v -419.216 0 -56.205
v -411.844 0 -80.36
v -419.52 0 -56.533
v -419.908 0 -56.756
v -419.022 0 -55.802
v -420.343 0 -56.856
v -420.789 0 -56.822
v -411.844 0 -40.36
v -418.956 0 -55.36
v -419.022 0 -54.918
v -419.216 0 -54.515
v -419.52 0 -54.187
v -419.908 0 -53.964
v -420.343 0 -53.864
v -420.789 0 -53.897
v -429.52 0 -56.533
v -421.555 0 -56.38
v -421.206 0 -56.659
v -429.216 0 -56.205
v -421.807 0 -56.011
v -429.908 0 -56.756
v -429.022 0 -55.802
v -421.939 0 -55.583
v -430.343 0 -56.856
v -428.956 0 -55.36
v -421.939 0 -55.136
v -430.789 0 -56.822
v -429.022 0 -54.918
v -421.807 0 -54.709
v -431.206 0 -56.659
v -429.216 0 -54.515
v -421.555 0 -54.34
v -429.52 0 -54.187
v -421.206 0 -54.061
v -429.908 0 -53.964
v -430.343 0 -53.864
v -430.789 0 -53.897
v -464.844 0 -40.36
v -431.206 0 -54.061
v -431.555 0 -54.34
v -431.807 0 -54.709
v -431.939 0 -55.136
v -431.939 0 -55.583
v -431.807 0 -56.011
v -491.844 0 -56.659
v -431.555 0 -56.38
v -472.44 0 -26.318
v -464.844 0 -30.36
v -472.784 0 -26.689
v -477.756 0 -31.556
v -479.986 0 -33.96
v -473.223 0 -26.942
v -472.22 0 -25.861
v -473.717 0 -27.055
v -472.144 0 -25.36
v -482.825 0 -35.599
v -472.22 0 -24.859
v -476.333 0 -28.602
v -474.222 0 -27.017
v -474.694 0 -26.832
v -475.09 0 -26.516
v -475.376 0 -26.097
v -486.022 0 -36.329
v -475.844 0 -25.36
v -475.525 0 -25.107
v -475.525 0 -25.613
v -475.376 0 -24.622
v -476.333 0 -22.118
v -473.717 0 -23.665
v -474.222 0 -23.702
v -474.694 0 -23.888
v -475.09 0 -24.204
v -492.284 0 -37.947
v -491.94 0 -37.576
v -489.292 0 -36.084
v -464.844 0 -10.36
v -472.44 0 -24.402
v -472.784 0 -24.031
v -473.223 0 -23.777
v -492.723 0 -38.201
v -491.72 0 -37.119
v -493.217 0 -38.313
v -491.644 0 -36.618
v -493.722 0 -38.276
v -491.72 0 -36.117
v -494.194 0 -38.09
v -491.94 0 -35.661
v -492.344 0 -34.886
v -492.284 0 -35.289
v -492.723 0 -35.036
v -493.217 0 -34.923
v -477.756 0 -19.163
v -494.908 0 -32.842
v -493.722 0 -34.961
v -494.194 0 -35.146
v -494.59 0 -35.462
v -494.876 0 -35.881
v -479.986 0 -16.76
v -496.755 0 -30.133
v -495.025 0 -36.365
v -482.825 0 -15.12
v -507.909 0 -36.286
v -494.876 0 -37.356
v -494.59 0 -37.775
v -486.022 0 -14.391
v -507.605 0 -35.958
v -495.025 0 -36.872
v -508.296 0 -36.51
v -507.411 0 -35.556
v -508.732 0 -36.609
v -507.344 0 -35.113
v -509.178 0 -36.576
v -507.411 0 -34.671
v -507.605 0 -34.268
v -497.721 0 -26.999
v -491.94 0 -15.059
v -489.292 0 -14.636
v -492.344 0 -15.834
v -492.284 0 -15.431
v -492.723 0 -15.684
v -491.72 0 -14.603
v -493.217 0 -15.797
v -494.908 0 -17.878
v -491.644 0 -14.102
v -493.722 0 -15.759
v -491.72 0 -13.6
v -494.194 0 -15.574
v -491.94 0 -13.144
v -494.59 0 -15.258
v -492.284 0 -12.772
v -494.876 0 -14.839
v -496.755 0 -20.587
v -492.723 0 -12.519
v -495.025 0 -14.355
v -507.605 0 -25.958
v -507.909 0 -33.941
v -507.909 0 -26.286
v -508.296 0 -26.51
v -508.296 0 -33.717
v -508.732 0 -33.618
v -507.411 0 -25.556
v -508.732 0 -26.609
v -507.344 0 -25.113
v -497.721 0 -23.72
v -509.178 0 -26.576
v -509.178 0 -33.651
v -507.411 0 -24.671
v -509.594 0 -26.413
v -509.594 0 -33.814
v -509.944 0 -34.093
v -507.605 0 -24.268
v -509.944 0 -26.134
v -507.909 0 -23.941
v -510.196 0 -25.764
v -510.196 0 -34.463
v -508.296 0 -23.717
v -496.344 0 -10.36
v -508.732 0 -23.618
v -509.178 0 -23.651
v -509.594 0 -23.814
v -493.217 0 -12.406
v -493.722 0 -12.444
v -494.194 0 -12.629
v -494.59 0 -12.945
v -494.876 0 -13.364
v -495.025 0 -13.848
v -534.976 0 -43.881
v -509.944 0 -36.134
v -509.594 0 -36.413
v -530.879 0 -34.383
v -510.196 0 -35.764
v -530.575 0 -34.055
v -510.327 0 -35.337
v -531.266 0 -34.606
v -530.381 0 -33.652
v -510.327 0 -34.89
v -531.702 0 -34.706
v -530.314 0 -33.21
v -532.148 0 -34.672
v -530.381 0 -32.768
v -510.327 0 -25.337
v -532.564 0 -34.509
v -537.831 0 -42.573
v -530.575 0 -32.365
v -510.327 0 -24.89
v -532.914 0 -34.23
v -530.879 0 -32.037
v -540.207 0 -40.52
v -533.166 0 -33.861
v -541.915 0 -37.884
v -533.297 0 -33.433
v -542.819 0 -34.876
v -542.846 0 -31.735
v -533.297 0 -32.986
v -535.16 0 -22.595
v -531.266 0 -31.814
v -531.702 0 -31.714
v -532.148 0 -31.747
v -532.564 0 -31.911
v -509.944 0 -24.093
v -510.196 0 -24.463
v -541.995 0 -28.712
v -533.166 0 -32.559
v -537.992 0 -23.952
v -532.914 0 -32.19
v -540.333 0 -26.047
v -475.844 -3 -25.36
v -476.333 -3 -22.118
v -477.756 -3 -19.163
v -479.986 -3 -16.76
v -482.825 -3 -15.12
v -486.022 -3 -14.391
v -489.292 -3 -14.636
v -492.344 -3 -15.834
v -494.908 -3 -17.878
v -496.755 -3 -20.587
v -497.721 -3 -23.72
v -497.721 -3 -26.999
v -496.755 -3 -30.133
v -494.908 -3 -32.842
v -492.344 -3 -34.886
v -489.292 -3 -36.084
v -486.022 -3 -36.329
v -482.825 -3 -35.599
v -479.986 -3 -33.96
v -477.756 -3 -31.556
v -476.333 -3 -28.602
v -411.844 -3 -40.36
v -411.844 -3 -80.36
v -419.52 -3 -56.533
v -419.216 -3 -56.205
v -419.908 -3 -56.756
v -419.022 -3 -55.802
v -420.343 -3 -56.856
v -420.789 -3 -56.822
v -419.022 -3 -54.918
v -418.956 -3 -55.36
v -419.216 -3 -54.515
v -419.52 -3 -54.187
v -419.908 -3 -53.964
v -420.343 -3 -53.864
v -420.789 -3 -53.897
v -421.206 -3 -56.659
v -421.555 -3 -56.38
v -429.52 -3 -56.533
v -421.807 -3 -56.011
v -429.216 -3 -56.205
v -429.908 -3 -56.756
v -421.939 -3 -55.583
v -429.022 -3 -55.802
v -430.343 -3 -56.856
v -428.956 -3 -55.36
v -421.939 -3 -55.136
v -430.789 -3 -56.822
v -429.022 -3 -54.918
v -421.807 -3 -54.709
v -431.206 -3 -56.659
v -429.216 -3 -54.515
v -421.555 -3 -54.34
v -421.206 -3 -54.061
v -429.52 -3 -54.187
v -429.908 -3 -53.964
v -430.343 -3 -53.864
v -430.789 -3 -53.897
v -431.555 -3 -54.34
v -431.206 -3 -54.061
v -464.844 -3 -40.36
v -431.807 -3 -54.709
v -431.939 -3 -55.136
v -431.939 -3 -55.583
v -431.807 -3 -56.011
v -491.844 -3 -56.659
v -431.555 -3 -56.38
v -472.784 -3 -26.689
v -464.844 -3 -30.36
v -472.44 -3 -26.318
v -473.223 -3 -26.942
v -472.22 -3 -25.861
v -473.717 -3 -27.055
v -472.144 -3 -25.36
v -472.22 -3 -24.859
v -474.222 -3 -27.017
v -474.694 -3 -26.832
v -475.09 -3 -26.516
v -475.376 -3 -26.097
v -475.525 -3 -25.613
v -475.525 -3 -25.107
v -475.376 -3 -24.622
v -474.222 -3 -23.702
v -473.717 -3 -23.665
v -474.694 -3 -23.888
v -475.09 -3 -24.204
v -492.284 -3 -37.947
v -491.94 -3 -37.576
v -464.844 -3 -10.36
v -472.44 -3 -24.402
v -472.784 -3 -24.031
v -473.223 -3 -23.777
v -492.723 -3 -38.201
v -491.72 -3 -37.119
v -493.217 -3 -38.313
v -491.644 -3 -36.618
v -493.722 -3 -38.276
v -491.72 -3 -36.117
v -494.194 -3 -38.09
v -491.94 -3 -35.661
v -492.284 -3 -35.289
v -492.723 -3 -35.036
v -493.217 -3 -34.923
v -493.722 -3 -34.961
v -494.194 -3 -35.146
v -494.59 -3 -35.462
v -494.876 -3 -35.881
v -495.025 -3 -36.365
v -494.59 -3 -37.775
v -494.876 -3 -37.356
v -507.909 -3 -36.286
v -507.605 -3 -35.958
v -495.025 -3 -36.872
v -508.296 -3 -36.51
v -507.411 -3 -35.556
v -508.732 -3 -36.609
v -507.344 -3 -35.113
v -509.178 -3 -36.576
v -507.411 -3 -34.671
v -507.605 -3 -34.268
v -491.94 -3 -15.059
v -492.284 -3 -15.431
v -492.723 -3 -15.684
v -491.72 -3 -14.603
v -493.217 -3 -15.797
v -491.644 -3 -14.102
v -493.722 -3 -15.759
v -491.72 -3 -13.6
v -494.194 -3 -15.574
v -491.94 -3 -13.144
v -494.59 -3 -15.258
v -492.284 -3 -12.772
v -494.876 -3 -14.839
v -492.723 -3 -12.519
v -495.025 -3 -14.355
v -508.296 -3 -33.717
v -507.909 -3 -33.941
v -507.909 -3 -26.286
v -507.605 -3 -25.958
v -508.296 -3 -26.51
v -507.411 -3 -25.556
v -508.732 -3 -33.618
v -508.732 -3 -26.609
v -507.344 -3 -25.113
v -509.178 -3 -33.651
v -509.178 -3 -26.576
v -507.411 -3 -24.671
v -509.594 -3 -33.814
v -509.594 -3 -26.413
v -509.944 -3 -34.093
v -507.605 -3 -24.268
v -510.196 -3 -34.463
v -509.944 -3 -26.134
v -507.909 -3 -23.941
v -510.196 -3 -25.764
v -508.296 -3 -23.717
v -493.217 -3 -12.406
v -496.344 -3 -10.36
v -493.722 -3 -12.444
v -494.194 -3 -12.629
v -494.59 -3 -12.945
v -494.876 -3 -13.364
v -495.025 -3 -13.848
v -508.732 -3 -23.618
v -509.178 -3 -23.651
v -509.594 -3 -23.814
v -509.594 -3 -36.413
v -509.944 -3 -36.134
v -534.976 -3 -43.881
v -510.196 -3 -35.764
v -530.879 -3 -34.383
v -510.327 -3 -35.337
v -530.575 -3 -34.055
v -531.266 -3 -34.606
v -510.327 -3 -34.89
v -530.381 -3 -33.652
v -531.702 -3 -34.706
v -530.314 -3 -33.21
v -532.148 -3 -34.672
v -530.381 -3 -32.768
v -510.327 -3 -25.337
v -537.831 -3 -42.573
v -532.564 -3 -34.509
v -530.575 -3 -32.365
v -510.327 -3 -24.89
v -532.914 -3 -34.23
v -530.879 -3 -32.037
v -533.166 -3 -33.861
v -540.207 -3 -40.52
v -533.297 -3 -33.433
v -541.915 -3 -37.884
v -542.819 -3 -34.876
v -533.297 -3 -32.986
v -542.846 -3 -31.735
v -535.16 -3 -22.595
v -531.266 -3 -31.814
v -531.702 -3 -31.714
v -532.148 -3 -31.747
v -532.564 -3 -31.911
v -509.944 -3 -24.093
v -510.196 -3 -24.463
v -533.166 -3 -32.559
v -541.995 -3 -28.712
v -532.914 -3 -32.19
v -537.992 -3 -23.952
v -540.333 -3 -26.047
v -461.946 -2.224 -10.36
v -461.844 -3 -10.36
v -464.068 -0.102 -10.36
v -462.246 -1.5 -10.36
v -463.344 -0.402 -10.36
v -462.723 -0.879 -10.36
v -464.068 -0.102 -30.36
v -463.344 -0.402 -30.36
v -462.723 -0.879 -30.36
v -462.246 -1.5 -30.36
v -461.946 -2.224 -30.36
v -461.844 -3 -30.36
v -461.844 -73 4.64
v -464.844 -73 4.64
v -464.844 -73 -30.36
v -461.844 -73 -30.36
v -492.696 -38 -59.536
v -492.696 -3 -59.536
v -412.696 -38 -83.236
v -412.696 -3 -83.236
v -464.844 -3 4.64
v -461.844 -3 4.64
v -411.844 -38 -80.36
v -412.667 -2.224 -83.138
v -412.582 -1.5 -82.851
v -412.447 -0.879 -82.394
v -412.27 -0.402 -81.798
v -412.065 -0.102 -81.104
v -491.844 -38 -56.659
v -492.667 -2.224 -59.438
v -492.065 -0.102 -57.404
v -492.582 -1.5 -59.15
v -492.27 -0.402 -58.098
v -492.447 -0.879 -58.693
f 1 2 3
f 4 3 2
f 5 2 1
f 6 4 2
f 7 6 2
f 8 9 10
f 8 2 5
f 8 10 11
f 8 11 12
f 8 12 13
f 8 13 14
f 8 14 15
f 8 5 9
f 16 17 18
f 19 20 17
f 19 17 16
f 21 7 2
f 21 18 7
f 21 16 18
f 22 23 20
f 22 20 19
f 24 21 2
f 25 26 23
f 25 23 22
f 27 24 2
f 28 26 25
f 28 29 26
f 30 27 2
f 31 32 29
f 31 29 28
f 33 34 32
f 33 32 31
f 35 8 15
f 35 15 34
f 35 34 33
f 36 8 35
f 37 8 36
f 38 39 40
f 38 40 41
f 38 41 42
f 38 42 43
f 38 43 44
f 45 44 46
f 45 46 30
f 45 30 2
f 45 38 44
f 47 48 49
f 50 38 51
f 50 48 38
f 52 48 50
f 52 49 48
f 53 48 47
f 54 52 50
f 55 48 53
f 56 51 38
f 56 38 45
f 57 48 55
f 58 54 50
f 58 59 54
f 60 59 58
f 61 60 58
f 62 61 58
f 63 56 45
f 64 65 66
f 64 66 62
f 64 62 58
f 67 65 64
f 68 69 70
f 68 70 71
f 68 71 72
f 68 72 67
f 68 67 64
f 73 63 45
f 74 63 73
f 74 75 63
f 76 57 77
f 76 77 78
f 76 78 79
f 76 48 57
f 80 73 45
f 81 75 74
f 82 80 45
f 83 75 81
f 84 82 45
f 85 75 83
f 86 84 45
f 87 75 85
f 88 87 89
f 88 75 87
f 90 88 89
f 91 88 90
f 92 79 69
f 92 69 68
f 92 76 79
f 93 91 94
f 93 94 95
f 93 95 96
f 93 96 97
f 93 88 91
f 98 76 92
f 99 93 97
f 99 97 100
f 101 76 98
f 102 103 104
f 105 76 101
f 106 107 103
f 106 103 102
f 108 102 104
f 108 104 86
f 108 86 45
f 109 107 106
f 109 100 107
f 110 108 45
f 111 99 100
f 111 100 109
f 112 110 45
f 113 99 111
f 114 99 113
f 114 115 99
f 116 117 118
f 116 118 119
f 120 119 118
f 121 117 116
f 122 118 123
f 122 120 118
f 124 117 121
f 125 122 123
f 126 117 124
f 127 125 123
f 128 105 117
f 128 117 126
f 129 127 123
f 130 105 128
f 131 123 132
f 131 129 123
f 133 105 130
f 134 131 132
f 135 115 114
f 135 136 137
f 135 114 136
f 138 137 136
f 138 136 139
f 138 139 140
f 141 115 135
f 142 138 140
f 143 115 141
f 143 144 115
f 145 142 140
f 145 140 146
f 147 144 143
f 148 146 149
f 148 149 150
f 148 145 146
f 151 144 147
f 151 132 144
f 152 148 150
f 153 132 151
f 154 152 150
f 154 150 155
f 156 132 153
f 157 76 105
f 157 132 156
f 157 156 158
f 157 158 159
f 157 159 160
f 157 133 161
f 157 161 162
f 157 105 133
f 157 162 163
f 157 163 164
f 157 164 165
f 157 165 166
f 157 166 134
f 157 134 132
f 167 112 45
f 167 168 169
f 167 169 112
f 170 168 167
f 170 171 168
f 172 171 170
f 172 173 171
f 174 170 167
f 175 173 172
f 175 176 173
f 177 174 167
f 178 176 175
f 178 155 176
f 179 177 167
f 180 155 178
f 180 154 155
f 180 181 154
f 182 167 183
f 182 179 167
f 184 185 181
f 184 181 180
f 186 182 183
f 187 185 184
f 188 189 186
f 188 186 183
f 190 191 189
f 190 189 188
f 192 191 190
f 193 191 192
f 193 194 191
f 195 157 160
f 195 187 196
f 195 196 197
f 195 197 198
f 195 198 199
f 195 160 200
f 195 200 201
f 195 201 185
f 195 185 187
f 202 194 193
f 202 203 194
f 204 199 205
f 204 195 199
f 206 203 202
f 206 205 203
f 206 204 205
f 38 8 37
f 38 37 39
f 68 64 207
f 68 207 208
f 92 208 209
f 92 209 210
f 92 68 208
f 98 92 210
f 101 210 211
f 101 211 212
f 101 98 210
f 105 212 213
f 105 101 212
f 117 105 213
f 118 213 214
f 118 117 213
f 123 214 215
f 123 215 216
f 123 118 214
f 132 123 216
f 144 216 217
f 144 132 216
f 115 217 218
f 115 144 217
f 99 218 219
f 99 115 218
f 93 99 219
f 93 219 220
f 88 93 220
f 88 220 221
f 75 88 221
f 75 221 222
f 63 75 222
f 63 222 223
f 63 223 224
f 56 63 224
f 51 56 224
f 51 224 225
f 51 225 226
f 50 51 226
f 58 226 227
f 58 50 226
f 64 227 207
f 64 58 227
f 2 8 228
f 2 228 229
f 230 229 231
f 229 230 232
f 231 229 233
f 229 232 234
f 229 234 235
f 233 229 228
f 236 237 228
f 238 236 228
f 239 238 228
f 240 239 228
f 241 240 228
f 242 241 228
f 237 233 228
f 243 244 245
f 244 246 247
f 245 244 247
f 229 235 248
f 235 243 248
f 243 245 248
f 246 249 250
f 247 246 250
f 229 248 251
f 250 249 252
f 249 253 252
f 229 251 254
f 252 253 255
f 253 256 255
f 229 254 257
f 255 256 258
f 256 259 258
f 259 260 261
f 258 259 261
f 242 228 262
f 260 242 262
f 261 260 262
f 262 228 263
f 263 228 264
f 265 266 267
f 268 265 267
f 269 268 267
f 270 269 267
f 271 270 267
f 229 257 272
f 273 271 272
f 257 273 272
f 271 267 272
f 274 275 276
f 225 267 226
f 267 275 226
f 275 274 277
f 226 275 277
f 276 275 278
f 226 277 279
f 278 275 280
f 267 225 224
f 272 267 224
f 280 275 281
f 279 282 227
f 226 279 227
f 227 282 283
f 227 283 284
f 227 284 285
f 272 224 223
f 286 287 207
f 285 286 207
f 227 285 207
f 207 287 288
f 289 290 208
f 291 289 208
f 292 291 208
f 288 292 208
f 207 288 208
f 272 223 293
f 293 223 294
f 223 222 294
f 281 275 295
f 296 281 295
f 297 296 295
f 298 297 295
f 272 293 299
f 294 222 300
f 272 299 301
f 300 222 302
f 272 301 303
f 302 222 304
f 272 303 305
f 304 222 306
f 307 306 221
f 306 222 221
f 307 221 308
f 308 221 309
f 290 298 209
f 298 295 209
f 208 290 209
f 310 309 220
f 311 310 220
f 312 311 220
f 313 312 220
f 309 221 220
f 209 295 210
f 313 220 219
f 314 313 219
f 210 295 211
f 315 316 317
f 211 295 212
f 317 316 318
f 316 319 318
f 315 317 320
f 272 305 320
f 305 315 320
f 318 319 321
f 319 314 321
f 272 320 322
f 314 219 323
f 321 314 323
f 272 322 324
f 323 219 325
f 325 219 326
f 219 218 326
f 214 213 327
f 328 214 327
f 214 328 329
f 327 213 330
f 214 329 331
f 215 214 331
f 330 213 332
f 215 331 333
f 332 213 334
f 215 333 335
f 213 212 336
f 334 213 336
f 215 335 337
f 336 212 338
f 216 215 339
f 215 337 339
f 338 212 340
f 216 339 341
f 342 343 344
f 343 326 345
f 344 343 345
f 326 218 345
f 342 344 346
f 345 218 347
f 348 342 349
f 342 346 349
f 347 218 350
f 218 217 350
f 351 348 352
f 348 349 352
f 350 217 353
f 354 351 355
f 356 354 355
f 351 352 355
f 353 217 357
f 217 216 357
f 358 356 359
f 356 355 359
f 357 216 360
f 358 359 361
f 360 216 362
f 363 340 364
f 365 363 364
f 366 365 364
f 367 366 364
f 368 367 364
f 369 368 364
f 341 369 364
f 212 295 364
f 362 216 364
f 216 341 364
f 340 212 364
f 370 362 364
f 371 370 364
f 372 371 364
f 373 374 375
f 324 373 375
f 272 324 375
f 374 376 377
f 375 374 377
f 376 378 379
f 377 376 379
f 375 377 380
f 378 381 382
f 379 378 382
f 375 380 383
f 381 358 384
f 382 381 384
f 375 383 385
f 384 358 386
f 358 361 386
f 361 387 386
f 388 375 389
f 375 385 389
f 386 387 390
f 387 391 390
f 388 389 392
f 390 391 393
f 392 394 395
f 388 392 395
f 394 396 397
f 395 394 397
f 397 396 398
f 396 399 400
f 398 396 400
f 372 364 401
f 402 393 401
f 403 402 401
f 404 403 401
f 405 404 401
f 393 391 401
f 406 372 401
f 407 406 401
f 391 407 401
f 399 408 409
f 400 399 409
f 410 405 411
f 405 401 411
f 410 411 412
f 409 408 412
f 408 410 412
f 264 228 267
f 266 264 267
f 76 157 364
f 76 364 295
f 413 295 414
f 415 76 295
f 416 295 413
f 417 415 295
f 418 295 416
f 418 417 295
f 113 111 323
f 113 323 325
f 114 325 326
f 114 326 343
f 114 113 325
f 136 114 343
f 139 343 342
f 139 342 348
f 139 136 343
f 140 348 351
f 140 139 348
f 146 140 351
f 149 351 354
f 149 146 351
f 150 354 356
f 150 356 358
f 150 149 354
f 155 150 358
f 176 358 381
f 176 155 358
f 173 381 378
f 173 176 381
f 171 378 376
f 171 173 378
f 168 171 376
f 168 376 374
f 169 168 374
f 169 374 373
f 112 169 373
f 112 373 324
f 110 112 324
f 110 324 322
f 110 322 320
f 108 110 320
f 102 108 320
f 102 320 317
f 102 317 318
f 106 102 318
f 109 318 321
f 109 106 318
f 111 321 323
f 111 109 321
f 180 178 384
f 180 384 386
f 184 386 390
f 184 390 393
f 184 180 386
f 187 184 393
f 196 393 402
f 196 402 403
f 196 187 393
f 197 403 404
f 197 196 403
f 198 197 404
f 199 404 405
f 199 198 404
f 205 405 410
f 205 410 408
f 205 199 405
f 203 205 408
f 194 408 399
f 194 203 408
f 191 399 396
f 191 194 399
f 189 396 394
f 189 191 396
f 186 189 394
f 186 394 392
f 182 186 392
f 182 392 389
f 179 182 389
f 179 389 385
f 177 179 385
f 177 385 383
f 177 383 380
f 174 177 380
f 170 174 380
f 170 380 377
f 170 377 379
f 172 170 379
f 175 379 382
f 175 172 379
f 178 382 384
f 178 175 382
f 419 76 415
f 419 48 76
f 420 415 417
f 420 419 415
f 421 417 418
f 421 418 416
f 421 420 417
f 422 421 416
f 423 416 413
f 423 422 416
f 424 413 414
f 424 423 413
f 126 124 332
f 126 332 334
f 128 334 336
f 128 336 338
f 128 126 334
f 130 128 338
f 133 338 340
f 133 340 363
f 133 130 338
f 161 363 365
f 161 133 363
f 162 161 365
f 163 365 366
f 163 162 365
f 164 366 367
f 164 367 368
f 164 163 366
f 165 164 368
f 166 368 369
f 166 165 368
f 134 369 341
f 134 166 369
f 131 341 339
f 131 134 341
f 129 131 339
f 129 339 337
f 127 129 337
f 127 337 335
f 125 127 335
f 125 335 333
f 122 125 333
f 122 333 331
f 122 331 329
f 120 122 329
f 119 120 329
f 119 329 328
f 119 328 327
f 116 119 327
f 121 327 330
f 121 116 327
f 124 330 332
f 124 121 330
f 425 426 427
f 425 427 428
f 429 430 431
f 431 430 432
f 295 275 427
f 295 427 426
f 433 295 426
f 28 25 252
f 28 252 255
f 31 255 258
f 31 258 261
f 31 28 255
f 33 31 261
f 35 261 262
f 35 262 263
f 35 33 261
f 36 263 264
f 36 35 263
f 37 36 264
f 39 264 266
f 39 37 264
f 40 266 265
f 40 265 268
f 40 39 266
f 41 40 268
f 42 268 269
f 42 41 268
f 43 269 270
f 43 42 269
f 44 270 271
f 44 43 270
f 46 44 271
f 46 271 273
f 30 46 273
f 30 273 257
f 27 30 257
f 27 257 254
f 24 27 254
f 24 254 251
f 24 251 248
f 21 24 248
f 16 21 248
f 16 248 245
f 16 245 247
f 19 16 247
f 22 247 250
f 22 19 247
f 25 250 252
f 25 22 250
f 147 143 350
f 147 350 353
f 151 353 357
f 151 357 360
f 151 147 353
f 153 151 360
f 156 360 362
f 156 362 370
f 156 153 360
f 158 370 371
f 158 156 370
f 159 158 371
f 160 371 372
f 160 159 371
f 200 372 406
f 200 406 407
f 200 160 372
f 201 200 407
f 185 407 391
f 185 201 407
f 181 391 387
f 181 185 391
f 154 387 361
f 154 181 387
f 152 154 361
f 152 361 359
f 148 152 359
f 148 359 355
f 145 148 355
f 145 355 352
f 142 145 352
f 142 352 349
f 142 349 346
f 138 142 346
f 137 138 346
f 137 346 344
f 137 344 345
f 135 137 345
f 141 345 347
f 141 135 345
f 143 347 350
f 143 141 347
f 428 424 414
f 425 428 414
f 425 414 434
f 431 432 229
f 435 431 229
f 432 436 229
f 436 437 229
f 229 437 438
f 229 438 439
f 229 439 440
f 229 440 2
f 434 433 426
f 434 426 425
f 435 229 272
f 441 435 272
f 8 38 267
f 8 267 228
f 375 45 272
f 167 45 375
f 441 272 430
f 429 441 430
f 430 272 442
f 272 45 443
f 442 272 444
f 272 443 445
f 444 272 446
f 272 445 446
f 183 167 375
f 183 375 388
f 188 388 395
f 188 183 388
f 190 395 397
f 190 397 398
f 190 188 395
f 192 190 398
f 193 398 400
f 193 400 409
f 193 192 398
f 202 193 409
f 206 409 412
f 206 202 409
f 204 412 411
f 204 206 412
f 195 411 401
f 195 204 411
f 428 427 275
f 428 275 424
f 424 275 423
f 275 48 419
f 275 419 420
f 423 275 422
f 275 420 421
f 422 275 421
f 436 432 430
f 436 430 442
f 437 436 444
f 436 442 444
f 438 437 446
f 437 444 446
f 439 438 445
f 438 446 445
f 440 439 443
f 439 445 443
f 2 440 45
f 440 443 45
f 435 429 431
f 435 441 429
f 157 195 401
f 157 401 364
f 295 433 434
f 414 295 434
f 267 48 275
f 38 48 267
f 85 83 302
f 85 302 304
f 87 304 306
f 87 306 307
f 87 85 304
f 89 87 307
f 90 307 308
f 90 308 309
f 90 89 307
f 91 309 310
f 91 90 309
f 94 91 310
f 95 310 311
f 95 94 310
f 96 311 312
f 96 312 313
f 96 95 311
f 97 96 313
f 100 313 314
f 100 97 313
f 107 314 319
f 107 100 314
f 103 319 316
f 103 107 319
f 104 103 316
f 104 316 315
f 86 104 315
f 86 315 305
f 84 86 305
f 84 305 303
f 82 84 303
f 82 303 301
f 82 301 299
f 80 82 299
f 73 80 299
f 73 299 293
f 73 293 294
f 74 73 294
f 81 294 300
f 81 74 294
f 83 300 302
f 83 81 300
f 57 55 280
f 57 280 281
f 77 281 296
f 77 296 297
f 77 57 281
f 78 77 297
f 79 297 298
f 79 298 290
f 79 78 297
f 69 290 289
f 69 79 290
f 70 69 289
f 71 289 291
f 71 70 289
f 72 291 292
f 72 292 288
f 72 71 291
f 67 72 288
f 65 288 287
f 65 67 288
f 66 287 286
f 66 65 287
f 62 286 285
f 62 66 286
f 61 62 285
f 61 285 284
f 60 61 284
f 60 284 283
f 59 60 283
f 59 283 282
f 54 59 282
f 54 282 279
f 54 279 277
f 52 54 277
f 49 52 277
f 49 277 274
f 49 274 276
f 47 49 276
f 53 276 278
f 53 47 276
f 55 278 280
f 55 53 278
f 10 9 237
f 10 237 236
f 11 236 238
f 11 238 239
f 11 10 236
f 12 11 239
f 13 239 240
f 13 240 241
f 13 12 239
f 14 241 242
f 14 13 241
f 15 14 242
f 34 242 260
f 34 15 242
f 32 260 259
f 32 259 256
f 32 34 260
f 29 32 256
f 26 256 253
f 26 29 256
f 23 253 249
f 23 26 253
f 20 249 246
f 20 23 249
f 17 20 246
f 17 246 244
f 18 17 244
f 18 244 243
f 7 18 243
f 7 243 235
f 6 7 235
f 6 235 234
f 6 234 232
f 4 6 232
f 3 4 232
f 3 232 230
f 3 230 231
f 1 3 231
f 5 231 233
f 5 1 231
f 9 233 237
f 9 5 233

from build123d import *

# Parameters (mm, degrees)
ESQUISSE3_R        = 1.5
ESQUISSE3_R_2      = 11
ESQUISSE3_R_3      = 1.7
BOSS_EXTRU_3_DEPTH = 3
ESQUISSE6_W        = 3
ESQUISSE6_H        = 35
BOSS_EXTRU_4_DEPTH = 70
BOSS_EXTRU_5_DEPTH = 35
CONG_1_R           = 3


with BuildPart() as part:
    # Esquisse3 → Boss.-Extru.3 (new body)
    with BuildSketch(Plane.XZ):
        with BuildLine():
            Line((-464.844143116, -40.359876935), (-411.844143116, -40.359876935))
            Line((-411.844143116, -40.359876935), (-411.844143116, -80.359876935))
            Line((-411.844143116, -80.359876935), (-412.696301805, -83.236302767))
            Line((-412.696301805, -83.236302767), (-492.696301805, -59.535815029))
            Line((-492.696301805, -59.535815029), (-491.844143116, -56.659389197))
            Line((-491.844143116, -56.659389197), (-534.975651854, -43.881416773))
            ThreePointArc((-534.975651854, -43.881416773), (-542.943725497, -33.306292776), (-535.160059098, -22.594711075))
            Line((-535.160059098, -22.594711075), (-496.344143116, -10.359876935))
            Line((-496.344143116, -10.359876935), (-461.844143116, -10.359876935))
            Line((-461.844143116, -10.359876935), (-461.844143116, -30.359876935))
            Line((-461.844143116, -30.359876935), (-464.844143116, -30.359876935))
            Line((-464.844143116, -30.359876935), (-464.844143116, -40.359876935))
        make_face()
        with Locations((-531.814143116, -33.209876935)):
            Circle(ESQUISSE3_R, mode=Mode.SUBTRACT)
        with Locations((-508.844143116, -35.113476935)):
            Circle(ESQUISSE3_R, mode=Mode.SUBTRACT)
        with Locations((-508.844143116, -25.113476935)):
            Circle(ESQUISSE3_R, mode=Mode.SUBTRACT)
        with Locations((-486.844143116, -25.359876935)):
            Circle(ESQUISSE3_R_2, mode=Mode.SUBTRACT)
        with Locations((-473.844143116, -25.359876935)):
            Circle(ESQUISSE3_R_3, mode=Mode.SUBTRACT)
        with Locations((-493.344143116, -36.618207185)):
            Circle(ESQUISSE3_R_3, mode=Mode.SUBTRACT)
        with Locations((-493.344143116, -14.101546686)):
            Circle(ESQUISSE3_R_3, mode=Mode.SUBTRACT)
        with Locations((-420.455543116, -55.359876935)):
            Circle(ESQUISSE3_R, mode=Mode.SUBTRACT)
        with Locations((-430.455543116, -55.359876935)):
            Circle(ESQUISSE3_R, mode=Mode.SUBTRACT)
    extrude(amount=BOSS_EXTRU_3_DEPTH)

    # Esquisse6 → Boss.-Extru.4 (add)
    with BuildSketch(Plane.XZ.offset(3)):
        with Locations((-463.344143116, -12.859876935)):
            Rectangle(ESQUISSE6_W, ESQUISSE6_H)
    extrude(amount=BOSS_EXTRU_4_DEPTH)

    # Esquisse9 → Boss.-Extru.5 (add)
    with BuildSketch(Plane.XZ.offset(3)):
        Polygon((-492.696301805, -59.535815029), (-412.696301805, -83.236302767), (-411.844143116, -80.359876935), (-491.844143116, -56.659389197), align=None)
    extrude(amount=BOSS_EXTRU_5_DEPTH)

    # Congé1
    cong_1_edges = [part.edges().sort_by_distance(p)[0] for p in [
        (-452.696301805, 0, -71.386058898),
        (-461.844143116, 0, -20.359876935),
    ]]
    fillet(cong_1_edges, radius=CONG_1_R)


solid = part.part
